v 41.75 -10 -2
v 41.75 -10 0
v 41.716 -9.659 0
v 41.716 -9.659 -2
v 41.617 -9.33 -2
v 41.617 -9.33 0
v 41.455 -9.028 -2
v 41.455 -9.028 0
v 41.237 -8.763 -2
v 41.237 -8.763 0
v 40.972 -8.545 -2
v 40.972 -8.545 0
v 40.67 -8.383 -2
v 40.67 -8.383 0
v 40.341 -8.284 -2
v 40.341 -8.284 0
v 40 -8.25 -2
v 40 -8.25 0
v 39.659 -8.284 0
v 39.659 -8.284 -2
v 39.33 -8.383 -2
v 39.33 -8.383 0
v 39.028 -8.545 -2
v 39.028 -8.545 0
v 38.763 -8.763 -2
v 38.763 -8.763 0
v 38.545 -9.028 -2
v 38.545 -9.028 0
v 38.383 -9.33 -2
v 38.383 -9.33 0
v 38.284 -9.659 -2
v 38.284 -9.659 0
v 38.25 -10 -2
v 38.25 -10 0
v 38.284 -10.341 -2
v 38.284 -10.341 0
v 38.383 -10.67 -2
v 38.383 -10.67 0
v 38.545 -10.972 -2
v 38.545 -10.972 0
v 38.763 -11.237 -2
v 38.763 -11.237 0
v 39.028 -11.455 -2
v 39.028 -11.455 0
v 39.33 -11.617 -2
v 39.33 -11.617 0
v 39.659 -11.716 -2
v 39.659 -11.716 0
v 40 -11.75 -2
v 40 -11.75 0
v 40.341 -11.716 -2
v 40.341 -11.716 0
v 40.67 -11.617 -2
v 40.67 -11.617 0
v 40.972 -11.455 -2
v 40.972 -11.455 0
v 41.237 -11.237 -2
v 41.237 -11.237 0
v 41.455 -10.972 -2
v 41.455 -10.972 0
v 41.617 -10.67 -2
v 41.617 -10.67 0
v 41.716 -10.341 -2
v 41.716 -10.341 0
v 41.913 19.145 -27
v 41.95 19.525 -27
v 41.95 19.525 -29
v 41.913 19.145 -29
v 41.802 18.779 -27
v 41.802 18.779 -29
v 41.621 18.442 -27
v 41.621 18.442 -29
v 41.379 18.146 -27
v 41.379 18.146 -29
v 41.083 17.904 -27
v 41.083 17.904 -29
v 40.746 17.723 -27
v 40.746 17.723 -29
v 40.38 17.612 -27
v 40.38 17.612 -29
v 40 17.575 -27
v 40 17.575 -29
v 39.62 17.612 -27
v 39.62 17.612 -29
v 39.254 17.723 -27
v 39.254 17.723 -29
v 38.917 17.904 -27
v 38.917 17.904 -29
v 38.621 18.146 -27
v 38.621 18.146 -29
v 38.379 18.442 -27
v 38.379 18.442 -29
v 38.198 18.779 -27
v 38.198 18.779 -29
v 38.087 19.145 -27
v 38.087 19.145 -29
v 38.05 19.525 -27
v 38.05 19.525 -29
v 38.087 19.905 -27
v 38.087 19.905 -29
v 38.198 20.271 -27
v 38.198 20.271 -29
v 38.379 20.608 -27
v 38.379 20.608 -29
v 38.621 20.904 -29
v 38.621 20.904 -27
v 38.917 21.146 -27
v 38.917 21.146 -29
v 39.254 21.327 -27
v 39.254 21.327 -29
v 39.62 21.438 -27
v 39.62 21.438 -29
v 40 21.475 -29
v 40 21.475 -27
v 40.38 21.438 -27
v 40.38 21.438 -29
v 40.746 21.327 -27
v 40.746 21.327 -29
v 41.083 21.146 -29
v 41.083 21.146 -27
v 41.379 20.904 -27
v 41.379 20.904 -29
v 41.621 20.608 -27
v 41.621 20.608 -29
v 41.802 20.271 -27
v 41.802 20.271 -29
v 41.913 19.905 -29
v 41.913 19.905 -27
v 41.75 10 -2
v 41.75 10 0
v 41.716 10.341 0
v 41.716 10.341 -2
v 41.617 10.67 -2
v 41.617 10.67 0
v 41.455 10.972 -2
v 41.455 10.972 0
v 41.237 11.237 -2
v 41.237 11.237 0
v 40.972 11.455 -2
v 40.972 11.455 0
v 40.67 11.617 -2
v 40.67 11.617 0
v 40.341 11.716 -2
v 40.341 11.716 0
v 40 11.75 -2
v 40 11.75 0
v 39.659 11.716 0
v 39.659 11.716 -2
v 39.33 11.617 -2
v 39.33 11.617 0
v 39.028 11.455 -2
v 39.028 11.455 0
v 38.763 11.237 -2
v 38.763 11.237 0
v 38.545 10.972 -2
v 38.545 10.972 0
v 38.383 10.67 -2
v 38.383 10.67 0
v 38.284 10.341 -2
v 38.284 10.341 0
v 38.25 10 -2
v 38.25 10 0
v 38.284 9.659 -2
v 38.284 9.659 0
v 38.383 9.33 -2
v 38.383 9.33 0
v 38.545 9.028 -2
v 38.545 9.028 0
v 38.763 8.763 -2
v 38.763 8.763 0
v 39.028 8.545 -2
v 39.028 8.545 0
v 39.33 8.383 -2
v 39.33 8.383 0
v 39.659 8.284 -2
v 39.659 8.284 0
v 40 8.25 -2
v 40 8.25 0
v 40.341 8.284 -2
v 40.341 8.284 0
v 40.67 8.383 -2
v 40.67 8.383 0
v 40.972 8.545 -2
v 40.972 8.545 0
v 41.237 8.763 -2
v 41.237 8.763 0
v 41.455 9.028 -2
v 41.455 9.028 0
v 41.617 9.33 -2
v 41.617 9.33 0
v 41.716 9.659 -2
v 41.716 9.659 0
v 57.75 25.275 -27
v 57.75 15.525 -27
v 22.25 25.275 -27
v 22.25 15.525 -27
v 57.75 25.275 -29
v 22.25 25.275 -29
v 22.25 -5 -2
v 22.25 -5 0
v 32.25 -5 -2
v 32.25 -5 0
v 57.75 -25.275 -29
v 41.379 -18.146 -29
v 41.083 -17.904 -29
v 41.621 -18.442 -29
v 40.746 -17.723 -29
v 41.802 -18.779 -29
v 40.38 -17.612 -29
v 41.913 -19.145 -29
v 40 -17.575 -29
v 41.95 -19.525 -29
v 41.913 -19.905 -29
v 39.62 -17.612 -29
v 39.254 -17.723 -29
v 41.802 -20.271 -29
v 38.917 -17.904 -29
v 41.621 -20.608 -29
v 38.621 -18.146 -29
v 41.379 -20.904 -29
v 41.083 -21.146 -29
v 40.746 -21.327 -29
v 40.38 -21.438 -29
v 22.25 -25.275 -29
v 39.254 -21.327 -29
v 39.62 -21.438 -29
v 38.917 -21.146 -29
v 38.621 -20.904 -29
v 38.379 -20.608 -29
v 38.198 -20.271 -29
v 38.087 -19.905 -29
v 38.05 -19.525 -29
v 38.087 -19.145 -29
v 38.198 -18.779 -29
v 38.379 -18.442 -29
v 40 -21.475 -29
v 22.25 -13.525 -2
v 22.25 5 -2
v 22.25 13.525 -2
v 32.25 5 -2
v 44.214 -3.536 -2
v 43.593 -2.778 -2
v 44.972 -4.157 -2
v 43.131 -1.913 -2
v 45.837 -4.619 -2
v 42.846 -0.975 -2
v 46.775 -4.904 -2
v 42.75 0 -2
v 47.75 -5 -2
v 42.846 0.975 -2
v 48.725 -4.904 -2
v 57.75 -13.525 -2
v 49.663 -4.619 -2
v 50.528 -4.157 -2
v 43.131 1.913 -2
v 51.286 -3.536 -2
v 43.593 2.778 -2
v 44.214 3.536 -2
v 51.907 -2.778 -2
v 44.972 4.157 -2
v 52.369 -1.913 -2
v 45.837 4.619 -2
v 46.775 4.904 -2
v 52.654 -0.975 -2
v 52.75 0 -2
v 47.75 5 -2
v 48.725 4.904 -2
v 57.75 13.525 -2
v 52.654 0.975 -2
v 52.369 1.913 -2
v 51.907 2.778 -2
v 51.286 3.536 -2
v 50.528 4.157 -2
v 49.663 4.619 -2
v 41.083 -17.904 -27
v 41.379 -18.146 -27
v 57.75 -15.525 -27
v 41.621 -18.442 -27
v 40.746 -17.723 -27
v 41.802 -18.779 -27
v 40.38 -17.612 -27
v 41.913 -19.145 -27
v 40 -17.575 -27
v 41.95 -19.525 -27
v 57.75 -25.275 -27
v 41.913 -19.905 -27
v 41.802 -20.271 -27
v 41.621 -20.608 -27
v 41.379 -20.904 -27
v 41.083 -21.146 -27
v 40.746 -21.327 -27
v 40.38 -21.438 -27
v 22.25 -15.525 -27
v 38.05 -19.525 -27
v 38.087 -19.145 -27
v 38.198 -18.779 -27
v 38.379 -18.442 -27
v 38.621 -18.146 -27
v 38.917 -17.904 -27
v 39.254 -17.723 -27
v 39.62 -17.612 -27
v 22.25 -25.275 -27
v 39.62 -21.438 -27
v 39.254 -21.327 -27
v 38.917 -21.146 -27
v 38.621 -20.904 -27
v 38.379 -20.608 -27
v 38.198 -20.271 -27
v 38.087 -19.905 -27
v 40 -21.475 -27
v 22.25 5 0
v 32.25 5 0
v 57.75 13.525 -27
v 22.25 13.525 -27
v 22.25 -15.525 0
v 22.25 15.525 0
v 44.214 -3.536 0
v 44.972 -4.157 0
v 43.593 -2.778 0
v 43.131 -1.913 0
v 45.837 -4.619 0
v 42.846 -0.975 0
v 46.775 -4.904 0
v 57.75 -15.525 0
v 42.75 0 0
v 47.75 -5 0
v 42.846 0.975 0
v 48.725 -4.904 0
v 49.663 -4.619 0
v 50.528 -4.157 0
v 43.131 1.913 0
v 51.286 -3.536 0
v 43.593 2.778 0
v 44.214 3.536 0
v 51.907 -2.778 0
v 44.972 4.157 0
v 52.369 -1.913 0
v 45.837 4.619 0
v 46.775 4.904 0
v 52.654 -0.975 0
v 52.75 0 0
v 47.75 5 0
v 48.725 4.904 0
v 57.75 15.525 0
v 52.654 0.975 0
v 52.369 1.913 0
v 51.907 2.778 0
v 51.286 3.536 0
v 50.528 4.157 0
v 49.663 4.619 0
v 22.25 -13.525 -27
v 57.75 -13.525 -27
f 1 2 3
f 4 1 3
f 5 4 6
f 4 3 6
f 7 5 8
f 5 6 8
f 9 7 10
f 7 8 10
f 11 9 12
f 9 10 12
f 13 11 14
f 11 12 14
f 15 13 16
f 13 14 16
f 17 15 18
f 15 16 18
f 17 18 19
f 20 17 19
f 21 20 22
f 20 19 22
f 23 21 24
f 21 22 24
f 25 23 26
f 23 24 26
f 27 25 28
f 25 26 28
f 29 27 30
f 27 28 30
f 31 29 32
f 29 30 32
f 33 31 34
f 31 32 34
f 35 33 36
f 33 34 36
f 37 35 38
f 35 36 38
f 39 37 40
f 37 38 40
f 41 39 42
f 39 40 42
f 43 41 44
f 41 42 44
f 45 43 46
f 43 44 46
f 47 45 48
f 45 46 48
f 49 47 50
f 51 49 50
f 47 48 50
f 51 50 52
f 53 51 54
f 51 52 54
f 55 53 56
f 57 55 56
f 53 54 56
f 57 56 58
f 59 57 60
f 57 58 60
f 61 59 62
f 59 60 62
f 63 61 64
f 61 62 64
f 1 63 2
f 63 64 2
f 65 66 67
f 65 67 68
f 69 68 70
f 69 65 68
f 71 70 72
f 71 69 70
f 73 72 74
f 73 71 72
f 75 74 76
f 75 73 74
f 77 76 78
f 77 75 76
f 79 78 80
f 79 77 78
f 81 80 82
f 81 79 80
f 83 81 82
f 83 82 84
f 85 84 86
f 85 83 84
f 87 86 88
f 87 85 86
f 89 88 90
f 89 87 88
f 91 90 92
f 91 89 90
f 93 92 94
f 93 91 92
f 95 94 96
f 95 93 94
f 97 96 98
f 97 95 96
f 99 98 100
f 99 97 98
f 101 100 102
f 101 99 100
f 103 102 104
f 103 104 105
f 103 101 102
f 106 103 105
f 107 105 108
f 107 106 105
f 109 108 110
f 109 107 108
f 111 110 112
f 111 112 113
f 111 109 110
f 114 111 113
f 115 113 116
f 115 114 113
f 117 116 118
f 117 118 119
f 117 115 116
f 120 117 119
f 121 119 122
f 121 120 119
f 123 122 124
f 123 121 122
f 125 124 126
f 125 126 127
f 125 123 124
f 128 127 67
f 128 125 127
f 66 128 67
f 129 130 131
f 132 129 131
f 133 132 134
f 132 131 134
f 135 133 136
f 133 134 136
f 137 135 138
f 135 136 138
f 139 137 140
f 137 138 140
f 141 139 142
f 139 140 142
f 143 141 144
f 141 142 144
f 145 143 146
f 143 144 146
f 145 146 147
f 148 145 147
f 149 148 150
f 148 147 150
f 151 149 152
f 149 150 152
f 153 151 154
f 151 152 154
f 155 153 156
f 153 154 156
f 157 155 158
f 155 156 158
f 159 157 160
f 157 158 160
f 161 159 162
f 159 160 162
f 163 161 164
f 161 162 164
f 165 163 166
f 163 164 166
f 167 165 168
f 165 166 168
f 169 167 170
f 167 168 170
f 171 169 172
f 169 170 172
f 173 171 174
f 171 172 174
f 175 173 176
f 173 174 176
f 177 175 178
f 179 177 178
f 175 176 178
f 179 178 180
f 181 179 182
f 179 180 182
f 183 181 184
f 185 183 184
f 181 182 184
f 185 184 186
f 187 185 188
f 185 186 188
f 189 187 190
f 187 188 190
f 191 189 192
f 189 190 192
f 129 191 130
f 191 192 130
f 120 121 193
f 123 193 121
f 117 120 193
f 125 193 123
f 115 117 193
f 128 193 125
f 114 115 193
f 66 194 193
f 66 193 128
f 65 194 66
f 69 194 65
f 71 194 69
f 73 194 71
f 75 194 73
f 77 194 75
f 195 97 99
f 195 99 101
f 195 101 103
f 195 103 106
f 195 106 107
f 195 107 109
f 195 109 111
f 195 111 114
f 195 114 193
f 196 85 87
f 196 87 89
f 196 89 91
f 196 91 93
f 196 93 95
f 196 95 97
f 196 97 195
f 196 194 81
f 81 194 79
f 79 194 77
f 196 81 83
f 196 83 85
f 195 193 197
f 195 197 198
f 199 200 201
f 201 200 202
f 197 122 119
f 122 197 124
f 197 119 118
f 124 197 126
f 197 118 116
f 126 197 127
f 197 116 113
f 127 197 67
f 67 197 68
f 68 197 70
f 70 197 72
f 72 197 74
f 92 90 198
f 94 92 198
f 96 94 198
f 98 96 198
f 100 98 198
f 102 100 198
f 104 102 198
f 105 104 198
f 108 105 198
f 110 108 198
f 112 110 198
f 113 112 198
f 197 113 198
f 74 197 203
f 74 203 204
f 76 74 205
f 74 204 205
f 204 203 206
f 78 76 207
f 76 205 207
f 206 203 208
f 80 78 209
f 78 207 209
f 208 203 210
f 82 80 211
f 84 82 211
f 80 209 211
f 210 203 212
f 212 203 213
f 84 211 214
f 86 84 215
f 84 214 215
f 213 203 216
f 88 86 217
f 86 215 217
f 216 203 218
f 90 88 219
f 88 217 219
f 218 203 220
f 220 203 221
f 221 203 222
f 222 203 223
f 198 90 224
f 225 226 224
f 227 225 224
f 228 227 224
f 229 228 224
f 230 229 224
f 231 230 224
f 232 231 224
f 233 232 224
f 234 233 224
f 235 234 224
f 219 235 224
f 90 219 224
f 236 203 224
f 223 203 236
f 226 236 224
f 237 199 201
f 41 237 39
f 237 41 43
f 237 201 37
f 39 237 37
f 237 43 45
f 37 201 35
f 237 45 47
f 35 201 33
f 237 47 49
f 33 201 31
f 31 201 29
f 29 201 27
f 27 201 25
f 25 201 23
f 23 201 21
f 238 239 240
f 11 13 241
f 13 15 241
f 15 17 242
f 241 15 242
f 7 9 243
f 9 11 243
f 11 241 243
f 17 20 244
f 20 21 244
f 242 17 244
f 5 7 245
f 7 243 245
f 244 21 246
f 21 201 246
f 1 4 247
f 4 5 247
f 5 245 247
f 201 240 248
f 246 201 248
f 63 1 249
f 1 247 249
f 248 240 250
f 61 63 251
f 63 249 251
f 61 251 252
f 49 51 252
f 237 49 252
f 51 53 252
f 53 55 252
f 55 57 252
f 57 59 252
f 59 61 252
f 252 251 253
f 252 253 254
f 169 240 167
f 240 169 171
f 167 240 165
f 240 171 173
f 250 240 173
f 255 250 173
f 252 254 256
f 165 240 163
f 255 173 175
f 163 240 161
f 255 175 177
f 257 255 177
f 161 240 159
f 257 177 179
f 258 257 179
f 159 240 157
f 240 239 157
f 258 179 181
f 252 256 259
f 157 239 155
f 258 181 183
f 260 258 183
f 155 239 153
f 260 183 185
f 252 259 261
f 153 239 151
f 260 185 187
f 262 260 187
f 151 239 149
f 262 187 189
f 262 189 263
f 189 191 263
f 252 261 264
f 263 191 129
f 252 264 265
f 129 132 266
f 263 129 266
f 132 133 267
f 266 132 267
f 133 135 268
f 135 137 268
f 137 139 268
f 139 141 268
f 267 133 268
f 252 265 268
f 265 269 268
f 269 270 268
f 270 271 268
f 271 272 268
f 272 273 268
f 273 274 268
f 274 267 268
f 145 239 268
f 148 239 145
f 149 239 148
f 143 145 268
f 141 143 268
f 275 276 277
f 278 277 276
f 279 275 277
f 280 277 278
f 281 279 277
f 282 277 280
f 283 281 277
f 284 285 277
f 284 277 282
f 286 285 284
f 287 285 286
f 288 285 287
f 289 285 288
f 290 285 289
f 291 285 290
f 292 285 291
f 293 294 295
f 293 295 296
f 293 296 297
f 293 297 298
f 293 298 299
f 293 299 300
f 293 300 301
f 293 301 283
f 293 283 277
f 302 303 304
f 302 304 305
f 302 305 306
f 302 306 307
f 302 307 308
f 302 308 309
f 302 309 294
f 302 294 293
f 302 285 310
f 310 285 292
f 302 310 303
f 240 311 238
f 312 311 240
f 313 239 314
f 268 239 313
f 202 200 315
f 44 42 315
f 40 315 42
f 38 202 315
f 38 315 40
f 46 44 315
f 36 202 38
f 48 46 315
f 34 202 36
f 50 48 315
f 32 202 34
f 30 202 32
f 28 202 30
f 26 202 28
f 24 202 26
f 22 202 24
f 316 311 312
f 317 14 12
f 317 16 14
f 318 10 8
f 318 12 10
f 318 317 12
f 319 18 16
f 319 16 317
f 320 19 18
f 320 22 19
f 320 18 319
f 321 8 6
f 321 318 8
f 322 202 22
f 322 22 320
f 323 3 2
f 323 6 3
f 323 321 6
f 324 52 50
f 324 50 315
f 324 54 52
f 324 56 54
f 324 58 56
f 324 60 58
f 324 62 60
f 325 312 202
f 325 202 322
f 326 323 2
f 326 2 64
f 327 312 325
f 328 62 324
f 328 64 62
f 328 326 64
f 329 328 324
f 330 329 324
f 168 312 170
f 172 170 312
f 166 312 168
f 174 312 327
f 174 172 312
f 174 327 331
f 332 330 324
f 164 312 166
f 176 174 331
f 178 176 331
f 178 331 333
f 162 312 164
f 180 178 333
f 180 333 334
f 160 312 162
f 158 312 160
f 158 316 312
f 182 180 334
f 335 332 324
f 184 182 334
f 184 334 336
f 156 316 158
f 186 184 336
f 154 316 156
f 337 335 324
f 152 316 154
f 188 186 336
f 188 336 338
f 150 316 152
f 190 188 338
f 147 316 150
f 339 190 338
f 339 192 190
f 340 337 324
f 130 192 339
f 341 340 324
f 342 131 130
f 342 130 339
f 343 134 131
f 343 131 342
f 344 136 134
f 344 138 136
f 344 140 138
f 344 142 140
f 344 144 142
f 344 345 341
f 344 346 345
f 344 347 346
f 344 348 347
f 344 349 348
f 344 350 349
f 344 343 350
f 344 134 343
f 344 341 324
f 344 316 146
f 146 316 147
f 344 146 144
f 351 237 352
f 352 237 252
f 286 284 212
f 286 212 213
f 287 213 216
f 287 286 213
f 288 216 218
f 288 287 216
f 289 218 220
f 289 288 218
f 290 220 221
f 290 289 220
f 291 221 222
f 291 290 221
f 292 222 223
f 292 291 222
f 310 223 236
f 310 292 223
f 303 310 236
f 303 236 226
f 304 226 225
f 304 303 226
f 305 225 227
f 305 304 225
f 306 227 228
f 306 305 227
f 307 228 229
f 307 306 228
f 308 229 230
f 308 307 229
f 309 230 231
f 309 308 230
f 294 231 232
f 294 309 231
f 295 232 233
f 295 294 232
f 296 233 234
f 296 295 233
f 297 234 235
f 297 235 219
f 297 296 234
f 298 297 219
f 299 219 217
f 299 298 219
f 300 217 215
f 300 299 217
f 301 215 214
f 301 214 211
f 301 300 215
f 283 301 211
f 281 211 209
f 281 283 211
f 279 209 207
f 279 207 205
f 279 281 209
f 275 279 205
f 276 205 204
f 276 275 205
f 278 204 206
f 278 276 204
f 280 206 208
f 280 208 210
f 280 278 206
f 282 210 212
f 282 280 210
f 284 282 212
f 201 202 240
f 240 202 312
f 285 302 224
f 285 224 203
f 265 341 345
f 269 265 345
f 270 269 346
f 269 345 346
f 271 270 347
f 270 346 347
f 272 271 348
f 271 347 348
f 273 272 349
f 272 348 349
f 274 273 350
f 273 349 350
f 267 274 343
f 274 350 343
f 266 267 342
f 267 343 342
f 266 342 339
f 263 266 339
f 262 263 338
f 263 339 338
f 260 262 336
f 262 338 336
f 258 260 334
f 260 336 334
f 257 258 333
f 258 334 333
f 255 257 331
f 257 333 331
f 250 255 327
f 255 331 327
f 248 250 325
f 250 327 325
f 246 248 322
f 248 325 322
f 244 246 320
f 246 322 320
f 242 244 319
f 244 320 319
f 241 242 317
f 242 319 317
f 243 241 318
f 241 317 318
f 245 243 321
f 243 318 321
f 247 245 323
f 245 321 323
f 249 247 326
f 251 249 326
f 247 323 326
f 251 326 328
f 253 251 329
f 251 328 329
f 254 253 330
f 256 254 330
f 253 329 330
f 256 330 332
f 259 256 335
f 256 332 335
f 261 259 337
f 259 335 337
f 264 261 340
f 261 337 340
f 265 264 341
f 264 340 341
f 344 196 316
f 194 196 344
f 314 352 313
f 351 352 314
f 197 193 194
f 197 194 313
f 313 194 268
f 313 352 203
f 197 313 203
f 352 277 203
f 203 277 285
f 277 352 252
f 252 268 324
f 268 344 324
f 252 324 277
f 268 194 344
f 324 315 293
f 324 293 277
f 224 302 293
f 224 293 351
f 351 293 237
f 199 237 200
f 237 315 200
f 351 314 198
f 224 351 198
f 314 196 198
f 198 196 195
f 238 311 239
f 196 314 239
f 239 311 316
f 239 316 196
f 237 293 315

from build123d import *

# Parameters (mm, degrees)
SKETCH072_W     = 35.5
SKETCH072_H     = 31.05
PAD050_DEPTH    = 2
SKETCH073_W     = 35.5
SKETCH073_H     = 2
PAD051_DEPTH    = 25
SKETCH074_R     = 1.95
PAD052_DEPTH    = 2
SKETCH075_R     = 1.75
SKETCH075_R_2   = 5
SKETCH075_W     = 10
SKETCH075_H     = 10
POCKET013_DEPTH = 2


with BuildPart() as part:
    # Sketch072 → Pad050 (new body)
    with BuildSketch(Plane.XY):
        Rectangle(SKETCH072_W, SKETCH072_H)
    extrude(amount=PAD050_DEPTH)

    # Sketch073 (on Face5 of Pad050) → Pad051 (join)
    with BuildSketch(Plane(origin=(0, 0, 0), x_dir=(1, 0, 0), z_dir=(0, 0, -1))):
        with Locations((0, 14.525)):
            Rectangle(SKETCH073_W, SKETCH073_H)
        with Locations((0, -14.525)):
            Rectangle(SKETCH073_W, SKETCH073_H)
    extrude(amount=PAD051_DEPTH)

    # Sketch074 (on Face16 of Pad051) → Pad052 (join)
    with BuildSketch(Plane(origin=(0, 0, -25), x_dir=(1, 0, 0), z_dir=(0, 0, -1))):
        Polygon((-17.75, 25.275), (17.75, 25.275), (17.75, 15.525), (17.75, -15.525), (17.75, -25.275), (-17.75, -25.275), (-17.75, -15.525), (-17.75, 15.525), align=None)
        with Locations((0, 19.525)):
            Circle(SKETCH074_R, mode=Mode.SUBTRACT)
        with Locations((0, -19.525)):
            Circle(SKETCH074_R, mode=Mode.SUBTRACT)
    extrude(amount=PAD052_DEPTH)

    # Sketch075 (on Face6 of Pad050) → Pocket013 (cut)
    with BuildSketch(Plane.XY.offset(2)):
        with Locations((0, 10)):
            Circle(SKETCH075_R)
        with Locations((0, -10)):
            Circle(SKETCH075_R)
        with Locations((7.75, 0)):
            Circle(SKETCH075_R_2)
        with Locations((-12.75, 0)):
            Rectangle(SKETCH075_W, SKETCH075_H)
    extrude(amount=-POCKET013_DEPTH, mode=Mode.SUBTRACT)


with BuildPart() as part_1:
    # Body017 placement: moved
    add(part.part.moved(Location((40, 0, -2))))


solid = part_1.part
